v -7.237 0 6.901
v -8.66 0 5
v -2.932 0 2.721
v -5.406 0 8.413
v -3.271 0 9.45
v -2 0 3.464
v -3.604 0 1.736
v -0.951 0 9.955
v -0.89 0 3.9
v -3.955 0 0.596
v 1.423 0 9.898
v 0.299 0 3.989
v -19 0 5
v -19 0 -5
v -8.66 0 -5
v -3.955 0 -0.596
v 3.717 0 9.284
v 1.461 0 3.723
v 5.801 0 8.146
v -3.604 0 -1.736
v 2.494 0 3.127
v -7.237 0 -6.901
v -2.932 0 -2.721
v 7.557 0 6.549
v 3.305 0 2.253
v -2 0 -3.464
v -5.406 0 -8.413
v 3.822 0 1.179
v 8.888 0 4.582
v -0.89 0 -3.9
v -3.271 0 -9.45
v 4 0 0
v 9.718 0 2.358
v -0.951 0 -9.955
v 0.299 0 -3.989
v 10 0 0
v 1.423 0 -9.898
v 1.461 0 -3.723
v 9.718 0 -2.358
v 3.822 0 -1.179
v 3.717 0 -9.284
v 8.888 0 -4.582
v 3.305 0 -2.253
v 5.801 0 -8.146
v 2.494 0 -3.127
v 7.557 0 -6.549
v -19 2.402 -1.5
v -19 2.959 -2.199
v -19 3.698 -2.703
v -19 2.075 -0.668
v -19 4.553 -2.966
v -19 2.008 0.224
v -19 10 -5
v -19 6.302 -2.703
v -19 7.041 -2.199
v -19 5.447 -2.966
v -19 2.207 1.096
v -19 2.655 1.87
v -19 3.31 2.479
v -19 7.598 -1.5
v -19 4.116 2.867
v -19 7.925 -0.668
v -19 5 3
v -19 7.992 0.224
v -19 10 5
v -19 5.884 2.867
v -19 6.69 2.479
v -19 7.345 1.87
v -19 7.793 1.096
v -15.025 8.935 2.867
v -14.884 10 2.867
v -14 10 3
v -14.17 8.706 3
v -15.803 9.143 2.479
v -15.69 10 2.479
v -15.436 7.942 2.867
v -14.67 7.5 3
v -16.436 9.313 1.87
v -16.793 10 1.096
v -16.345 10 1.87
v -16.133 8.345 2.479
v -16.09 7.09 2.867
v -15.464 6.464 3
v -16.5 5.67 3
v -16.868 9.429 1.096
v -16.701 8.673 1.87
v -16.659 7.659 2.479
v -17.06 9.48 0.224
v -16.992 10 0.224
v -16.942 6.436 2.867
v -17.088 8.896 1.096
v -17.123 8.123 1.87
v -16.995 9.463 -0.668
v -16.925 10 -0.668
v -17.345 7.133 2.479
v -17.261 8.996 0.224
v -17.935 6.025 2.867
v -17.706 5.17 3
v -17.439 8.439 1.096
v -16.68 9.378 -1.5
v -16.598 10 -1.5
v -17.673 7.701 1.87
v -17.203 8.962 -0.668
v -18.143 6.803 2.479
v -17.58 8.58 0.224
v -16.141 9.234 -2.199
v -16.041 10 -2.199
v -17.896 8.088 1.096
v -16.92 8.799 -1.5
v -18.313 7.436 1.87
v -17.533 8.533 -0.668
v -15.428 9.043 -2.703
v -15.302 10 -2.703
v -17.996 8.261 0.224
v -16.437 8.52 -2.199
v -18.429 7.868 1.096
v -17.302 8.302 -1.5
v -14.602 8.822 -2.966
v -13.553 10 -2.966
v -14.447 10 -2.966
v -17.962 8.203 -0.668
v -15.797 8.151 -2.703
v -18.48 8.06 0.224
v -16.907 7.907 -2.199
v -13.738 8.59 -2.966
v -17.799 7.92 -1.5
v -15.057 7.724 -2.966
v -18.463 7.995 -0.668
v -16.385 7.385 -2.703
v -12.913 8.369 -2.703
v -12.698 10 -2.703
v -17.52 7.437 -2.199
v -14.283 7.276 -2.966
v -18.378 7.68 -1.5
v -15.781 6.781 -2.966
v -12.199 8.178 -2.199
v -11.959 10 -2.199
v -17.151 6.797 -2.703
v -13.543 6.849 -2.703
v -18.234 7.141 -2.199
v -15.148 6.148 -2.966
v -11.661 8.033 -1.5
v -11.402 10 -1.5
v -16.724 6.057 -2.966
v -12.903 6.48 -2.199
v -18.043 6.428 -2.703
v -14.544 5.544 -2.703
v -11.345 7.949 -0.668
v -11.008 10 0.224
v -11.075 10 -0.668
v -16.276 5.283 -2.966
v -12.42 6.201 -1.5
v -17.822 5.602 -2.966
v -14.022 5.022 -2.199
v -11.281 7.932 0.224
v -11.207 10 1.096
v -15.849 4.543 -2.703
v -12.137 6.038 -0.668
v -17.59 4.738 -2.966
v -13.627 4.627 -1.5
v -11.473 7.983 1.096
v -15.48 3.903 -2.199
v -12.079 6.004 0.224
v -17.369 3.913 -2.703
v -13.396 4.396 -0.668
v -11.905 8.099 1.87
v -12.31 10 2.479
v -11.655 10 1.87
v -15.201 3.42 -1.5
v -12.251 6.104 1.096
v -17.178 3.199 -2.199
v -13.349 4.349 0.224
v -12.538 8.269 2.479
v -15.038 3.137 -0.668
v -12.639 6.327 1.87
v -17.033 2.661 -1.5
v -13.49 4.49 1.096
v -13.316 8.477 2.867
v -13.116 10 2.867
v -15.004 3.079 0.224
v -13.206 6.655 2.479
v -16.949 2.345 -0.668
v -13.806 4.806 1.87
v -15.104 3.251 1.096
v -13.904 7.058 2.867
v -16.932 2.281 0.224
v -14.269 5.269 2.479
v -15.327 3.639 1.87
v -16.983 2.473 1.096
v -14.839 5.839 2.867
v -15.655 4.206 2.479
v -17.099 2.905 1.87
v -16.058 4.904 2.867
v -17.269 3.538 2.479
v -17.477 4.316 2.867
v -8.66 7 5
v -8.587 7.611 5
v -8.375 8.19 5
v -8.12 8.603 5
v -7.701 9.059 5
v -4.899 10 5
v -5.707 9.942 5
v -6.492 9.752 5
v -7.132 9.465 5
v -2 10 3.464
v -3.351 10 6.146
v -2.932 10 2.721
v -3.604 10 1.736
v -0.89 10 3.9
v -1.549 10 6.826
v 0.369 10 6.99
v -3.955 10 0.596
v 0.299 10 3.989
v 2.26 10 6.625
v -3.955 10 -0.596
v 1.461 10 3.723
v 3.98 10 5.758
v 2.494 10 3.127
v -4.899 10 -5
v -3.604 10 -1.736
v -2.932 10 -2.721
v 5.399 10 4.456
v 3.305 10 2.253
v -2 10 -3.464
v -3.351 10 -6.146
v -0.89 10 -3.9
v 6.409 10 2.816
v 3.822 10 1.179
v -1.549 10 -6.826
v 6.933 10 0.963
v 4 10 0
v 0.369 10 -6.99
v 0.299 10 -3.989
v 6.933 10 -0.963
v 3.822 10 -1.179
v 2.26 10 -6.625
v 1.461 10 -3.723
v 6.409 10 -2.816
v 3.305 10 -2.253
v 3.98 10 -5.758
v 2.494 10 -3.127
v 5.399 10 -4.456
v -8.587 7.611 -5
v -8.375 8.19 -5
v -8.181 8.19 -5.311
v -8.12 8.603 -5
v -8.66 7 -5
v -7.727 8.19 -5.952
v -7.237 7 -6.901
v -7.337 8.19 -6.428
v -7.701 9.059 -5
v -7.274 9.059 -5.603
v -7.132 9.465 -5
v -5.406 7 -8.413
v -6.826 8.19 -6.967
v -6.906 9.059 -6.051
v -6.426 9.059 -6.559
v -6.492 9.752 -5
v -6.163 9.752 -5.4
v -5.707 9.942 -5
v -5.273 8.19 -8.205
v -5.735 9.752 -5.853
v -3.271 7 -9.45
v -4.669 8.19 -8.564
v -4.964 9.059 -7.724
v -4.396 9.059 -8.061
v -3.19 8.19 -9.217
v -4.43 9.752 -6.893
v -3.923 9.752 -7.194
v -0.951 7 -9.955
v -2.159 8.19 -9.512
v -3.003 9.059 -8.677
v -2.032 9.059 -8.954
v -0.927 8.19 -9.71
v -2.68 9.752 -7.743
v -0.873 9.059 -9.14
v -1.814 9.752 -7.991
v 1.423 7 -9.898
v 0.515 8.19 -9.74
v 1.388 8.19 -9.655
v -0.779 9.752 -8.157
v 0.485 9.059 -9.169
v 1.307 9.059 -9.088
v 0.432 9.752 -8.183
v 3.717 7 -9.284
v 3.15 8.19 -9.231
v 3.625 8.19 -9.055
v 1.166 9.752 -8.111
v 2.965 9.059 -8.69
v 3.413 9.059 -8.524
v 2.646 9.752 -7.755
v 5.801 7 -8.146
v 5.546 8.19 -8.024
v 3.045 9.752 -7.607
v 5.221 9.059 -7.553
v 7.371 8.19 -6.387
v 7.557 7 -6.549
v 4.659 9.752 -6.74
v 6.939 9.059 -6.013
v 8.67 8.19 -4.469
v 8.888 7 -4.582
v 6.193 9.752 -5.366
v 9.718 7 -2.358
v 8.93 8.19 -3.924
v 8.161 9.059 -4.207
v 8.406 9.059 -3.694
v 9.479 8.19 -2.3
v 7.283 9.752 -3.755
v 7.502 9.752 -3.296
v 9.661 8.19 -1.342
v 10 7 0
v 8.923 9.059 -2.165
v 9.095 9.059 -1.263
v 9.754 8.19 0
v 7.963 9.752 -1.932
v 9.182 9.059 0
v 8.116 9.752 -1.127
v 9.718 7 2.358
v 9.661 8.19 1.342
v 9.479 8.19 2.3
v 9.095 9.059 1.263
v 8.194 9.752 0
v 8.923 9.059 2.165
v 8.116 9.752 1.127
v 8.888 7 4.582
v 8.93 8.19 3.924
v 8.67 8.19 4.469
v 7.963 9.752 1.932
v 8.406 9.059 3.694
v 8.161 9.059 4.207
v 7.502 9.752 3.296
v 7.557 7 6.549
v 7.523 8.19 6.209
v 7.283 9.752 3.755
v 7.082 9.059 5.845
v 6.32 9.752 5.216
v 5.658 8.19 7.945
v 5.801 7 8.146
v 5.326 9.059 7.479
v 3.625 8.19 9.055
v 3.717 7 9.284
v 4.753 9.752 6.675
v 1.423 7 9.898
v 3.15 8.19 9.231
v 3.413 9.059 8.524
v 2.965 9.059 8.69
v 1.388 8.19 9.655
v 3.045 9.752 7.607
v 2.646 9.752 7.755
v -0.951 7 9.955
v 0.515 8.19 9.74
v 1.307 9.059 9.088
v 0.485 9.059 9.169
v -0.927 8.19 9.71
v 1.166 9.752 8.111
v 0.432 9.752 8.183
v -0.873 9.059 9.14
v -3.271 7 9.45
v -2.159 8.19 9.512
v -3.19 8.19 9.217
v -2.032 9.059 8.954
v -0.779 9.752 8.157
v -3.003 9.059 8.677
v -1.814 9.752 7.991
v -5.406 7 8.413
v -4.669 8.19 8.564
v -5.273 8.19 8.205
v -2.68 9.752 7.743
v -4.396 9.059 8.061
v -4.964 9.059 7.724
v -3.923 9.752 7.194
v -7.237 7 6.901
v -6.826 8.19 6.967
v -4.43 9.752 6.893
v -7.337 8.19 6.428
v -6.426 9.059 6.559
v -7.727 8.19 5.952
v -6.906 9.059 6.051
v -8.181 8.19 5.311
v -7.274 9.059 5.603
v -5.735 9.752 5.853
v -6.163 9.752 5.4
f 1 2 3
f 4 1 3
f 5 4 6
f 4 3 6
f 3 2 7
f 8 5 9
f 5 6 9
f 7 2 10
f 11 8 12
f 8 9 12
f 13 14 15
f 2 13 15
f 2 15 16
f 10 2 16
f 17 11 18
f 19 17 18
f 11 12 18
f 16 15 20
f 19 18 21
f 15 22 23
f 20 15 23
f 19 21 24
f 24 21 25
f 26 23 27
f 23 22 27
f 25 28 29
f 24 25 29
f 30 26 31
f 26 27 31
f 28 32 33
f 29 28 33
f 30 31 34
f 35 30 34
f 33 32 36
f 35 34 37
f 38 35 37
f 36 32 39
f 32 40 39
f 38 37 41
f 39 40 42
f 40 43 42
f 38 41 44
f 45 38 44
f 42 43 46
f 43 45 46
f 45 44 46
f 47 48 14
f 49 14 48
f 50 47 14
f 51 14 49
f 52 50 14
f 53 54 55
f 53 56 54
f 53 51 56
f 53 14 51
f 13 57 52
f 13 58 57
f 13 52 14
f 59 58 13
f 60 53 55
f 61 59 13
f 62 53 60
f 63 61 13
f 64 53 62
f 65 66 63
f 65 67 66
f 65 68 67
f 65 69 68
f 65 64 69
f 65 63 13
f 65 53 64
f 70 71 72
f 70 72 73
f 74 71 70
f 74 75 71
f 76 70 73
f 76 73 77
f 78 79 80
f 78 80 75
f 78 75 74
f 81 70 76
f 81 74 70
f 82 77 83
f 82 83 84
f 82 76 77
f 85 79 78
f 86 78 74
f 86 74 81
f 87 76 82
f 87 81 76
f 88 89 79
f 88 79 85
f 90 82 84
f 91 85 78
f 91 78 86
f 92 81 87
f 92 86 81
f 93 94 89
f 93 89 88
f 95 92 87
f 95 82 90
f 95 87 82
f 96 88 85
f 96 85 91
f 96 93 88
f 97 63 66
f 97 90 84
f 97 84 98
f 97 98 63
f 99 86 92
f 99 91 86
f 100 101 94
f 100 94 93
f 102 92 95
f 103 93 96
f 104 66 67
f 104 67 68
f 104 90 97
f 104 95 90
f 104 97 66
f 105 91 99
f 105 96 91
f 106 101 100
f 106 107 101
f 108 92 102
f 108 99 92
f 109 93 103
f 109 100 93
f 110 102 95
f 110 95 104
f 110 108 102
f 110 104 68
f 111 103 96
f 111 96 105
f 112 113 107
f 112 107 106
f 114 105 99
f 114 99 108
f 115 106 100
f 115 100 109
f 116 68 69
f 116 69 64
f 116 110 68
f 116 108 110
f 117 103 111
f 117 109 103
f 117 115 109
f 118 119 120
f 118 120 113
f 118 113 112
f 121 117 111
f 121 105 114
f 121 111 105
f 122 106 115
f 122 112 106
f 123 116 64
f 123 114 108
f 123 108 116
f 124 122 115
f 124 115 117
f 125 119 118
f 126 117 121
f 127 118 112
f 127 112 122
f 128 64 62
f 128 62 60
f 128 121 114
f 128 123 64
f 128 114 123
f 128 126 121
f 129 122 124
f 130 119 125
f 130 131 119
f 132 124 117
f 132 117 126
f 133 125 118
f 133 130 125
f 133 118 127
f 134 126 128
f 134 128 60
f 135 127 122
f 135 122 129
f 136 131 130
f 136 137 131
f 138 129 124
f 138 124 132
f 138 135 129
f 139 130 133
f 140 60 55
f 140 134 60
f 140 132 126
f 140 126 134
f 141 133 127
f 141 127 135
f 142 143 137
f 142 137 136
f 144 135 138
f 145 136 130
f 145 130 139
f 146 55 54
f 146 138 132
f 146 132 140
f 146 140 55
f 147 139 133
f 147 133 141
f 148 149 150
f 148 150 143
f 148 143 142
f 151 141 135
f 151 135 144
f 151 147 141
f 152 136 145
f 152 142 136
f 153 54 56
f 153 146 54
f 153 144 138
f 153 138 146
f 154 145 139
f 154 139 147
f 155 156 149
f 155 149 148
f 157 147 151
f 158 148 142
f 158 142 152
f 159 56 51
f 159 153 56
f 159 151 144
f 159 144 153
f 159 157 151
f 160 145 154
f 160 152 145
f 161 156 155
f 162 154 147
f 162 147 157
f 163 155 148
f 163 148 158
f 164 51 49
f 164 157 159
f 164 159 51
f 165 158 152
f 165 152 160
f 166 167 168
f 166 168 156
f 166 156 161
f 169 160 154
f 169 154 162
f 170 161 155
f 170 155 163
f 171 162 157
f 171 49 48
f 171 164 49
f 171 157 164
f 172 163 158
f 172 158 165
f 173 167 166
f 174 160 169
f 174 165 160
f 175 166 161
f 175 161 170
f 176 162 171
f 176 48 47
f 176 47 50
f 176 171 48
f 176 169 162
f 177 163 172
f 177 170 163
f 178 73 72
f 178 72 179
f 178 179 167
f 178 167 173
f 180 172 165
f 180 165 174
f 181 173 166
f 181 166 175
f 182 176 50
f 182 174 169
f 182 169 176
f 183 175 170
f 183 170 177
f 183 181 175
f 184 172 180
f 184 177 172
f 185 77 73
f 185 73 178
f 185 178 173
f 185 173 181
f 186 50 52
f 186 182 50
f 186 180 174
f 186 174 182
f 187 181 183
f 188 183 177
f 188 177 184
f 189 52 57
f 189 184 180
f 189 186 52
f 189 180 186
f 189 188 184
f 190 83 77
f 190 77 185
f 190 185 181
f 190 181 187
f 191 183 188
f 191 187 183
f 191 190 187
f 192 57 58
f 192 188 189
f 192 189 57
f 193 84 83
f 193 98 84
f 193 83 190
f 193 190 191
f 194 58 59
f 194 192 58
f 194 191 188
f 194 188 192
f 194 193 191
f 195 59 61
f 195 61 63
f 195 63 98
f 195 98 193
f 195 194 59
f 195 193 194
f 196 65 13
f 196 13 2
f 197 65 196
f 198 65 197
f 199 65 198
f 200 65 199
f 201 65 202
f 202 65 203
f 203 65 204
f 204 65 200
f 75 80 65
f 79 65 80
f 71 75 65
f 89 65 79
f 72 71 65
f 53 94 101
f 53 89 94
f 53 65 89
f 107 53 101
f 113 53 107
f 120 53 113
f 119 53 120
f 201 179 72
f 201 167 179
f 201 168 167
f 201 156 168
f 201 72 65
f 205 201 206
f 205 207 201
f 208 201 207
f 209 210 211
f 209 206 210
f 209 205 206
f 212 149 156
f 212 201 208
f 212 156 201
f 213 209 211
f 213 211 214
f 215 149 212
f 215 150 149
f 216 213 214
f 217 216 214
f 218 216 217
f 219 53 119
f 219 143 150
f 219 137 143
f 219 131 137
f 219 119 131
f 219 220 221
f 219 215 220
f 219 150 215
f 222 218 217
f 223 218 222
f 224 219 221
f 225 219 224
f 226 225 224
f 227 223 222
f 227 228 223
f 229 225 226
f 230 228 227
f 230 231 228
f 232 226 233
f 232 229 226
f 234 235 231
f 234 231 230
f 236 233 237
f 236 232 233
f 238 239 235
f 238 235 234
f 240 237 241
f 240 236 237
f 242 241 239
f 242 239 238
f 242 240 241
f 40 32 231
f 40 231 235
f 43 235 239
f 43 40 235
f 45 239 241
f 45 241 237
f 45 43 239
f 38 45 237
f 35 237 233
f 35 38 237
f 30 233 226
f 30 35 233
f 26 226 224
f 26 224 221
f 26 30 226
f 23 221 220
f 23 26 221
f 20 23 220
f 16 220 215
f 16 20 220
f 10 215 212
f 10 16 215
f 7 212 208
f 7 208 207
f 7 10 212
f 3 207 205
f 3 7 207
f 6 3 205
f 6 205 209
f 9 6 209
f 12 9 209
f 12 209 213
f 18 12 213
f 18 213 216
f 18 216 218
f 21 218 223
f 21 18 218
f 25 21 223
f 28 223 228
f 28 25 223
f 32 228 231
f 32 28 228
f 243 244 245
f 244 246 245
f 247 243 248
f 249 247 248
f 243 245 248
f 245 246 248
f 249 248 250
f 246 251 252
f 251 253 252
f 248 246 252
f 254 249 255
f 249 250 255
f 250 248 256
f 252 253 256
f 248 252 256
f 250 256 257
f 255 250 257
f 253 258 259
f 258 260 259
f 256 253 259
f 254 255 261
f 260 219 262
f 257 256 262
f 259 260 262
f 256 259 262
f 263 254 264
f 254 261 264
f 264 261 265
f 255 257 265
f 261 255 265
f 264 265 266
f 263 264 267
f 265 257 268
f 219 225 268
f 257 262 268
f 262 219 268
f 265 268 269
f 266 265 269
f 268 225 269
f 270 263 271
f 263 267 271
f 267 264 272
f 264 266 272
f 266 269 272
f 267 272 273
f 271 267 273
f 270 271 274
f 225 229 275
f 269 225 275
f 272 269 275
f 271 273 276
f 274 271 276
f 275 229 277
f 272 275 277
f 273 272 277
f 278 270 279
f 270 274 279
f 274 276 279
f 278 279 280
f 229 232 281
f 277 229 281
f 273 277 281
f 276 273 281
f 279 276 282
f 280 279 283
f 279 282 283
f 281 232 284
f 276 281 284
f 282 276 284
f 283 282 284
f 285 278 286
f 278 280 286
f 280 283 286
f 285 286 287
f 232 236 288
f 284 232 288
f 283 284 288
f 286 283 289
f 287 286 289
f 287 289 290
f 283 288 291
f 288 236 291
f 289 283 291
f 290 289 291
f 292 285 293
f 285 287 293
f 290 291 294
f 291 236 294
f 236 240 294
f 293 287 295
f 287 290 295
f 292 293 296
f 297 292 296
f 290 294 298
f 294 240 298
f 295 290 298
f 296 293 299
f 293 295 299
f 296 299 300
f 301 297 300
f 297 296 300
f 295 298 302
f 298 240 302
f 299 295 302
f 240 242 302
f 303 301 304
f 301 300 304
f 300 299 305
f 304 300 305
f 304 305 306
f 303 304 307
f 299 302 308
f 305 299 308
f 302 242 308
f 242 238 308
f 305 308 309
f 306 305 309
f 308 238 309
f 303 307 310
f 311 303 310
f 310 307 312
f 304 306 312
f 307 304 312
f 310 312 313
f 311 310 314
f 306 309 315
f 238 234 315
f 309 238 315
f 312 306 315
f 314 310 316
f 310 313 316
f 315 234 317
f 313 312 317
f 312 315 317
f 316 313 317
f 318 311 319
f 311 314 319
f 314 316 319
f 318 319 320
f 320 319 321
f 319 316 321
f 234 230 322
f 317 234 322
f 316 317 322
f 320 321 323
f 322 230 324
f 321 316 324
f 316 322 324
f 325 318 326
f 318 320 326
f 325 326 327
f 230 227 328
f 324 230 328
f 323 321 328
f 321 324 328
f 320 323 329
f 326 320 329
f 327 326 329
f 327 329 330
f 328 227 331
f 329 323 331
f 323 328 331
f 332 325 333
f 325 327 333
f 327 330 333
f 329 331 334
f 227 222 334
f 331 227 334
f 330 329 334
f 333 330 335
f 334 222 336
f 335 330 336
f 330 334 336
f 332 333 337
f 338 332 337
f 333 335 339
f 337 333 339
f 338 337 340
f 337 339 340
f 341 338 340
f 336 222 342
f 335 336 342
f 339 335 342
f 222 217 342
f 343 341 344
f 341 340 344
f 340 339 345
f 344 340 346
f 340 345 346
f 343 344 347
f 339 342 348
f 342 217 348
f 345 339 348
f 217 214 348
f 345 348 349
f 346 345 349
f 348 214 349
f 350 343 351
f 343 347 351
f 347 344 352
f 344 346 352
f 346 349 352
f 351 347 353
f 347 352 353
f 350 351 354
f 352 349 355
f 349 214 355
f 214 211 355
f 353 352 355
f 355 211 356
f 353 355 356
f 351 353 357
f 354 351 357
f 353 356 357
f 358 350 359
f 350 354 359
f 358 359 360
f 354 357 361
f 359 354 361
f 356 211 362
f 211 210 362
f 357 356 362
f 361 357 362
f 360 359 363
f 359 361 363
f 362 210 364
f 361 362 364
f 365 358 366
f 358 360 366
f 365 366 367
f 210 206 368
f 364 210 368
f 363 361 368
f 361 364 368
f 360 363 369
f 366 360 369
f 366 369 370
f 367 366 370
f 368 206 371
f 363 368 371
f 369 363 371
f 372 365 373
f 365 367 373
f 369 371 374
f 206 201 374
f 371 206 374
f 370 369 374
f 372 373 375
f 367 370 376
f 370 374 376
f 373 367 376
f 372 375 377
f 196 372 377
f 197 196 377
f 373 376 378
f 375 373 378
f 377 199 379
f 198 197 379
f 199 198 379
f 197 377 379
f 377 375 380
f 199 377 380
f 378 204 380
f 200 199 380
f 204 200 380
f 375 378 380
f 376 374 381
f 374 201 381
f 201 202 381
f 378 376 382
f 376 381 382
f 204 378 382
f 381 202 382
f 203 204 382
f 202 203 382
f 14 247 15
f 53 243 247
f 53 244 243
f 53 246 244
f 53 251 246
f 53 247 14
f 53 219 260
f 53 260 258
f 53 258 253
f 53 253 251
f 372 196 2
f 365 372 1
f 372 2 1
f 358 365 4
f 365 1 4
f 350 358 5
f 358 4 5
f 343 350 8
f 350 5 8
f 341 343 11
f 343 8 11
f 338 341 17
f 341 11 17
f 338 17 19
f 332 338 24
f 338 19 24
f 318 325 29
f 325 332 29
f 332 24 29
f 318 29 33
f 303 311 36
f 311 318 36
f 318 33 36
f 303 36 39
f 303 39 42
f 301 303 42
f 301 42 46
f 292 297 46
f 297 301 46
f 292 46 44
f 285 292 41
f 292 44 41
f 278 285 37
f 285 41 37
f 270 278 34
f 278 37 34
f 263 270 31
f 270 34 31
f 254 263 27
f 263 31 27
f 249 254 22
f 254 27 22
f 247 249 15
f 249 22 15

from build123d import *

# Parameters (mm, degrees)
SKETCH1_R           = 10
SKETCH1_R_2         = 4
BOSS_EXTRUDE1_DEPTH = 10
BOSS_EXTRUDE2_DEPTH = 10
SKETCH3_R           = 3
FILLET1_R           = 3


with BuildPart() as part:
    # Sketch1 → Boss-Extrude1 (new body)
    with BuildSketch(Plane(origin=(0, 0, 0), x_dir=(1, 0, 0), z_dir=(0, 1, 0))):
        Circle(SKETCH1_R)
        Circle(SKETCH1_R_2, mode=Mode.SUBTRACT)
    extrude(amount=BOSS_EXTRUDE1_DEPTH)

    # Sketch2 → Boss-Extrude2 (add)
    with BuildSketch(Plane(origin=(0, 10, 0), x_dir=(1, 0, 0), z_dir=(0, 1, 0))):
        with BuildLine():
            Line((-19, -5), (-8.660254038, -5))
            ThreePointArc((-8.660254038, -5), (-10, 0), (-8.660254038, 5))
            Line((-8.660254038, 5), (-19, 5))
            Line((-19, 5), (-19, -5))
        make_face()
    extrude(amount=-BOSS_EXTRUDE2_DEPTH)

    # Sketch3 → Cut-Revolve1 (revolve, cut)
    with BuildSketch(Plane.ZY.offset(19)):
        with Locations((0, 5)):
            Circle(SKETCH3_R)
    revolve(axis=Axis((-19, 10, 5), (0, 0, -1)), mode=Mode.SUBTRACT)

    # Fillet1
    fillet1_edges = [part.edges().sort_by_distance(p)[0] for p in [
        (10, 10, 0),
    ]]
    fillet(fillet1_edges, radius=FILLET1_R)


solid = part.part
